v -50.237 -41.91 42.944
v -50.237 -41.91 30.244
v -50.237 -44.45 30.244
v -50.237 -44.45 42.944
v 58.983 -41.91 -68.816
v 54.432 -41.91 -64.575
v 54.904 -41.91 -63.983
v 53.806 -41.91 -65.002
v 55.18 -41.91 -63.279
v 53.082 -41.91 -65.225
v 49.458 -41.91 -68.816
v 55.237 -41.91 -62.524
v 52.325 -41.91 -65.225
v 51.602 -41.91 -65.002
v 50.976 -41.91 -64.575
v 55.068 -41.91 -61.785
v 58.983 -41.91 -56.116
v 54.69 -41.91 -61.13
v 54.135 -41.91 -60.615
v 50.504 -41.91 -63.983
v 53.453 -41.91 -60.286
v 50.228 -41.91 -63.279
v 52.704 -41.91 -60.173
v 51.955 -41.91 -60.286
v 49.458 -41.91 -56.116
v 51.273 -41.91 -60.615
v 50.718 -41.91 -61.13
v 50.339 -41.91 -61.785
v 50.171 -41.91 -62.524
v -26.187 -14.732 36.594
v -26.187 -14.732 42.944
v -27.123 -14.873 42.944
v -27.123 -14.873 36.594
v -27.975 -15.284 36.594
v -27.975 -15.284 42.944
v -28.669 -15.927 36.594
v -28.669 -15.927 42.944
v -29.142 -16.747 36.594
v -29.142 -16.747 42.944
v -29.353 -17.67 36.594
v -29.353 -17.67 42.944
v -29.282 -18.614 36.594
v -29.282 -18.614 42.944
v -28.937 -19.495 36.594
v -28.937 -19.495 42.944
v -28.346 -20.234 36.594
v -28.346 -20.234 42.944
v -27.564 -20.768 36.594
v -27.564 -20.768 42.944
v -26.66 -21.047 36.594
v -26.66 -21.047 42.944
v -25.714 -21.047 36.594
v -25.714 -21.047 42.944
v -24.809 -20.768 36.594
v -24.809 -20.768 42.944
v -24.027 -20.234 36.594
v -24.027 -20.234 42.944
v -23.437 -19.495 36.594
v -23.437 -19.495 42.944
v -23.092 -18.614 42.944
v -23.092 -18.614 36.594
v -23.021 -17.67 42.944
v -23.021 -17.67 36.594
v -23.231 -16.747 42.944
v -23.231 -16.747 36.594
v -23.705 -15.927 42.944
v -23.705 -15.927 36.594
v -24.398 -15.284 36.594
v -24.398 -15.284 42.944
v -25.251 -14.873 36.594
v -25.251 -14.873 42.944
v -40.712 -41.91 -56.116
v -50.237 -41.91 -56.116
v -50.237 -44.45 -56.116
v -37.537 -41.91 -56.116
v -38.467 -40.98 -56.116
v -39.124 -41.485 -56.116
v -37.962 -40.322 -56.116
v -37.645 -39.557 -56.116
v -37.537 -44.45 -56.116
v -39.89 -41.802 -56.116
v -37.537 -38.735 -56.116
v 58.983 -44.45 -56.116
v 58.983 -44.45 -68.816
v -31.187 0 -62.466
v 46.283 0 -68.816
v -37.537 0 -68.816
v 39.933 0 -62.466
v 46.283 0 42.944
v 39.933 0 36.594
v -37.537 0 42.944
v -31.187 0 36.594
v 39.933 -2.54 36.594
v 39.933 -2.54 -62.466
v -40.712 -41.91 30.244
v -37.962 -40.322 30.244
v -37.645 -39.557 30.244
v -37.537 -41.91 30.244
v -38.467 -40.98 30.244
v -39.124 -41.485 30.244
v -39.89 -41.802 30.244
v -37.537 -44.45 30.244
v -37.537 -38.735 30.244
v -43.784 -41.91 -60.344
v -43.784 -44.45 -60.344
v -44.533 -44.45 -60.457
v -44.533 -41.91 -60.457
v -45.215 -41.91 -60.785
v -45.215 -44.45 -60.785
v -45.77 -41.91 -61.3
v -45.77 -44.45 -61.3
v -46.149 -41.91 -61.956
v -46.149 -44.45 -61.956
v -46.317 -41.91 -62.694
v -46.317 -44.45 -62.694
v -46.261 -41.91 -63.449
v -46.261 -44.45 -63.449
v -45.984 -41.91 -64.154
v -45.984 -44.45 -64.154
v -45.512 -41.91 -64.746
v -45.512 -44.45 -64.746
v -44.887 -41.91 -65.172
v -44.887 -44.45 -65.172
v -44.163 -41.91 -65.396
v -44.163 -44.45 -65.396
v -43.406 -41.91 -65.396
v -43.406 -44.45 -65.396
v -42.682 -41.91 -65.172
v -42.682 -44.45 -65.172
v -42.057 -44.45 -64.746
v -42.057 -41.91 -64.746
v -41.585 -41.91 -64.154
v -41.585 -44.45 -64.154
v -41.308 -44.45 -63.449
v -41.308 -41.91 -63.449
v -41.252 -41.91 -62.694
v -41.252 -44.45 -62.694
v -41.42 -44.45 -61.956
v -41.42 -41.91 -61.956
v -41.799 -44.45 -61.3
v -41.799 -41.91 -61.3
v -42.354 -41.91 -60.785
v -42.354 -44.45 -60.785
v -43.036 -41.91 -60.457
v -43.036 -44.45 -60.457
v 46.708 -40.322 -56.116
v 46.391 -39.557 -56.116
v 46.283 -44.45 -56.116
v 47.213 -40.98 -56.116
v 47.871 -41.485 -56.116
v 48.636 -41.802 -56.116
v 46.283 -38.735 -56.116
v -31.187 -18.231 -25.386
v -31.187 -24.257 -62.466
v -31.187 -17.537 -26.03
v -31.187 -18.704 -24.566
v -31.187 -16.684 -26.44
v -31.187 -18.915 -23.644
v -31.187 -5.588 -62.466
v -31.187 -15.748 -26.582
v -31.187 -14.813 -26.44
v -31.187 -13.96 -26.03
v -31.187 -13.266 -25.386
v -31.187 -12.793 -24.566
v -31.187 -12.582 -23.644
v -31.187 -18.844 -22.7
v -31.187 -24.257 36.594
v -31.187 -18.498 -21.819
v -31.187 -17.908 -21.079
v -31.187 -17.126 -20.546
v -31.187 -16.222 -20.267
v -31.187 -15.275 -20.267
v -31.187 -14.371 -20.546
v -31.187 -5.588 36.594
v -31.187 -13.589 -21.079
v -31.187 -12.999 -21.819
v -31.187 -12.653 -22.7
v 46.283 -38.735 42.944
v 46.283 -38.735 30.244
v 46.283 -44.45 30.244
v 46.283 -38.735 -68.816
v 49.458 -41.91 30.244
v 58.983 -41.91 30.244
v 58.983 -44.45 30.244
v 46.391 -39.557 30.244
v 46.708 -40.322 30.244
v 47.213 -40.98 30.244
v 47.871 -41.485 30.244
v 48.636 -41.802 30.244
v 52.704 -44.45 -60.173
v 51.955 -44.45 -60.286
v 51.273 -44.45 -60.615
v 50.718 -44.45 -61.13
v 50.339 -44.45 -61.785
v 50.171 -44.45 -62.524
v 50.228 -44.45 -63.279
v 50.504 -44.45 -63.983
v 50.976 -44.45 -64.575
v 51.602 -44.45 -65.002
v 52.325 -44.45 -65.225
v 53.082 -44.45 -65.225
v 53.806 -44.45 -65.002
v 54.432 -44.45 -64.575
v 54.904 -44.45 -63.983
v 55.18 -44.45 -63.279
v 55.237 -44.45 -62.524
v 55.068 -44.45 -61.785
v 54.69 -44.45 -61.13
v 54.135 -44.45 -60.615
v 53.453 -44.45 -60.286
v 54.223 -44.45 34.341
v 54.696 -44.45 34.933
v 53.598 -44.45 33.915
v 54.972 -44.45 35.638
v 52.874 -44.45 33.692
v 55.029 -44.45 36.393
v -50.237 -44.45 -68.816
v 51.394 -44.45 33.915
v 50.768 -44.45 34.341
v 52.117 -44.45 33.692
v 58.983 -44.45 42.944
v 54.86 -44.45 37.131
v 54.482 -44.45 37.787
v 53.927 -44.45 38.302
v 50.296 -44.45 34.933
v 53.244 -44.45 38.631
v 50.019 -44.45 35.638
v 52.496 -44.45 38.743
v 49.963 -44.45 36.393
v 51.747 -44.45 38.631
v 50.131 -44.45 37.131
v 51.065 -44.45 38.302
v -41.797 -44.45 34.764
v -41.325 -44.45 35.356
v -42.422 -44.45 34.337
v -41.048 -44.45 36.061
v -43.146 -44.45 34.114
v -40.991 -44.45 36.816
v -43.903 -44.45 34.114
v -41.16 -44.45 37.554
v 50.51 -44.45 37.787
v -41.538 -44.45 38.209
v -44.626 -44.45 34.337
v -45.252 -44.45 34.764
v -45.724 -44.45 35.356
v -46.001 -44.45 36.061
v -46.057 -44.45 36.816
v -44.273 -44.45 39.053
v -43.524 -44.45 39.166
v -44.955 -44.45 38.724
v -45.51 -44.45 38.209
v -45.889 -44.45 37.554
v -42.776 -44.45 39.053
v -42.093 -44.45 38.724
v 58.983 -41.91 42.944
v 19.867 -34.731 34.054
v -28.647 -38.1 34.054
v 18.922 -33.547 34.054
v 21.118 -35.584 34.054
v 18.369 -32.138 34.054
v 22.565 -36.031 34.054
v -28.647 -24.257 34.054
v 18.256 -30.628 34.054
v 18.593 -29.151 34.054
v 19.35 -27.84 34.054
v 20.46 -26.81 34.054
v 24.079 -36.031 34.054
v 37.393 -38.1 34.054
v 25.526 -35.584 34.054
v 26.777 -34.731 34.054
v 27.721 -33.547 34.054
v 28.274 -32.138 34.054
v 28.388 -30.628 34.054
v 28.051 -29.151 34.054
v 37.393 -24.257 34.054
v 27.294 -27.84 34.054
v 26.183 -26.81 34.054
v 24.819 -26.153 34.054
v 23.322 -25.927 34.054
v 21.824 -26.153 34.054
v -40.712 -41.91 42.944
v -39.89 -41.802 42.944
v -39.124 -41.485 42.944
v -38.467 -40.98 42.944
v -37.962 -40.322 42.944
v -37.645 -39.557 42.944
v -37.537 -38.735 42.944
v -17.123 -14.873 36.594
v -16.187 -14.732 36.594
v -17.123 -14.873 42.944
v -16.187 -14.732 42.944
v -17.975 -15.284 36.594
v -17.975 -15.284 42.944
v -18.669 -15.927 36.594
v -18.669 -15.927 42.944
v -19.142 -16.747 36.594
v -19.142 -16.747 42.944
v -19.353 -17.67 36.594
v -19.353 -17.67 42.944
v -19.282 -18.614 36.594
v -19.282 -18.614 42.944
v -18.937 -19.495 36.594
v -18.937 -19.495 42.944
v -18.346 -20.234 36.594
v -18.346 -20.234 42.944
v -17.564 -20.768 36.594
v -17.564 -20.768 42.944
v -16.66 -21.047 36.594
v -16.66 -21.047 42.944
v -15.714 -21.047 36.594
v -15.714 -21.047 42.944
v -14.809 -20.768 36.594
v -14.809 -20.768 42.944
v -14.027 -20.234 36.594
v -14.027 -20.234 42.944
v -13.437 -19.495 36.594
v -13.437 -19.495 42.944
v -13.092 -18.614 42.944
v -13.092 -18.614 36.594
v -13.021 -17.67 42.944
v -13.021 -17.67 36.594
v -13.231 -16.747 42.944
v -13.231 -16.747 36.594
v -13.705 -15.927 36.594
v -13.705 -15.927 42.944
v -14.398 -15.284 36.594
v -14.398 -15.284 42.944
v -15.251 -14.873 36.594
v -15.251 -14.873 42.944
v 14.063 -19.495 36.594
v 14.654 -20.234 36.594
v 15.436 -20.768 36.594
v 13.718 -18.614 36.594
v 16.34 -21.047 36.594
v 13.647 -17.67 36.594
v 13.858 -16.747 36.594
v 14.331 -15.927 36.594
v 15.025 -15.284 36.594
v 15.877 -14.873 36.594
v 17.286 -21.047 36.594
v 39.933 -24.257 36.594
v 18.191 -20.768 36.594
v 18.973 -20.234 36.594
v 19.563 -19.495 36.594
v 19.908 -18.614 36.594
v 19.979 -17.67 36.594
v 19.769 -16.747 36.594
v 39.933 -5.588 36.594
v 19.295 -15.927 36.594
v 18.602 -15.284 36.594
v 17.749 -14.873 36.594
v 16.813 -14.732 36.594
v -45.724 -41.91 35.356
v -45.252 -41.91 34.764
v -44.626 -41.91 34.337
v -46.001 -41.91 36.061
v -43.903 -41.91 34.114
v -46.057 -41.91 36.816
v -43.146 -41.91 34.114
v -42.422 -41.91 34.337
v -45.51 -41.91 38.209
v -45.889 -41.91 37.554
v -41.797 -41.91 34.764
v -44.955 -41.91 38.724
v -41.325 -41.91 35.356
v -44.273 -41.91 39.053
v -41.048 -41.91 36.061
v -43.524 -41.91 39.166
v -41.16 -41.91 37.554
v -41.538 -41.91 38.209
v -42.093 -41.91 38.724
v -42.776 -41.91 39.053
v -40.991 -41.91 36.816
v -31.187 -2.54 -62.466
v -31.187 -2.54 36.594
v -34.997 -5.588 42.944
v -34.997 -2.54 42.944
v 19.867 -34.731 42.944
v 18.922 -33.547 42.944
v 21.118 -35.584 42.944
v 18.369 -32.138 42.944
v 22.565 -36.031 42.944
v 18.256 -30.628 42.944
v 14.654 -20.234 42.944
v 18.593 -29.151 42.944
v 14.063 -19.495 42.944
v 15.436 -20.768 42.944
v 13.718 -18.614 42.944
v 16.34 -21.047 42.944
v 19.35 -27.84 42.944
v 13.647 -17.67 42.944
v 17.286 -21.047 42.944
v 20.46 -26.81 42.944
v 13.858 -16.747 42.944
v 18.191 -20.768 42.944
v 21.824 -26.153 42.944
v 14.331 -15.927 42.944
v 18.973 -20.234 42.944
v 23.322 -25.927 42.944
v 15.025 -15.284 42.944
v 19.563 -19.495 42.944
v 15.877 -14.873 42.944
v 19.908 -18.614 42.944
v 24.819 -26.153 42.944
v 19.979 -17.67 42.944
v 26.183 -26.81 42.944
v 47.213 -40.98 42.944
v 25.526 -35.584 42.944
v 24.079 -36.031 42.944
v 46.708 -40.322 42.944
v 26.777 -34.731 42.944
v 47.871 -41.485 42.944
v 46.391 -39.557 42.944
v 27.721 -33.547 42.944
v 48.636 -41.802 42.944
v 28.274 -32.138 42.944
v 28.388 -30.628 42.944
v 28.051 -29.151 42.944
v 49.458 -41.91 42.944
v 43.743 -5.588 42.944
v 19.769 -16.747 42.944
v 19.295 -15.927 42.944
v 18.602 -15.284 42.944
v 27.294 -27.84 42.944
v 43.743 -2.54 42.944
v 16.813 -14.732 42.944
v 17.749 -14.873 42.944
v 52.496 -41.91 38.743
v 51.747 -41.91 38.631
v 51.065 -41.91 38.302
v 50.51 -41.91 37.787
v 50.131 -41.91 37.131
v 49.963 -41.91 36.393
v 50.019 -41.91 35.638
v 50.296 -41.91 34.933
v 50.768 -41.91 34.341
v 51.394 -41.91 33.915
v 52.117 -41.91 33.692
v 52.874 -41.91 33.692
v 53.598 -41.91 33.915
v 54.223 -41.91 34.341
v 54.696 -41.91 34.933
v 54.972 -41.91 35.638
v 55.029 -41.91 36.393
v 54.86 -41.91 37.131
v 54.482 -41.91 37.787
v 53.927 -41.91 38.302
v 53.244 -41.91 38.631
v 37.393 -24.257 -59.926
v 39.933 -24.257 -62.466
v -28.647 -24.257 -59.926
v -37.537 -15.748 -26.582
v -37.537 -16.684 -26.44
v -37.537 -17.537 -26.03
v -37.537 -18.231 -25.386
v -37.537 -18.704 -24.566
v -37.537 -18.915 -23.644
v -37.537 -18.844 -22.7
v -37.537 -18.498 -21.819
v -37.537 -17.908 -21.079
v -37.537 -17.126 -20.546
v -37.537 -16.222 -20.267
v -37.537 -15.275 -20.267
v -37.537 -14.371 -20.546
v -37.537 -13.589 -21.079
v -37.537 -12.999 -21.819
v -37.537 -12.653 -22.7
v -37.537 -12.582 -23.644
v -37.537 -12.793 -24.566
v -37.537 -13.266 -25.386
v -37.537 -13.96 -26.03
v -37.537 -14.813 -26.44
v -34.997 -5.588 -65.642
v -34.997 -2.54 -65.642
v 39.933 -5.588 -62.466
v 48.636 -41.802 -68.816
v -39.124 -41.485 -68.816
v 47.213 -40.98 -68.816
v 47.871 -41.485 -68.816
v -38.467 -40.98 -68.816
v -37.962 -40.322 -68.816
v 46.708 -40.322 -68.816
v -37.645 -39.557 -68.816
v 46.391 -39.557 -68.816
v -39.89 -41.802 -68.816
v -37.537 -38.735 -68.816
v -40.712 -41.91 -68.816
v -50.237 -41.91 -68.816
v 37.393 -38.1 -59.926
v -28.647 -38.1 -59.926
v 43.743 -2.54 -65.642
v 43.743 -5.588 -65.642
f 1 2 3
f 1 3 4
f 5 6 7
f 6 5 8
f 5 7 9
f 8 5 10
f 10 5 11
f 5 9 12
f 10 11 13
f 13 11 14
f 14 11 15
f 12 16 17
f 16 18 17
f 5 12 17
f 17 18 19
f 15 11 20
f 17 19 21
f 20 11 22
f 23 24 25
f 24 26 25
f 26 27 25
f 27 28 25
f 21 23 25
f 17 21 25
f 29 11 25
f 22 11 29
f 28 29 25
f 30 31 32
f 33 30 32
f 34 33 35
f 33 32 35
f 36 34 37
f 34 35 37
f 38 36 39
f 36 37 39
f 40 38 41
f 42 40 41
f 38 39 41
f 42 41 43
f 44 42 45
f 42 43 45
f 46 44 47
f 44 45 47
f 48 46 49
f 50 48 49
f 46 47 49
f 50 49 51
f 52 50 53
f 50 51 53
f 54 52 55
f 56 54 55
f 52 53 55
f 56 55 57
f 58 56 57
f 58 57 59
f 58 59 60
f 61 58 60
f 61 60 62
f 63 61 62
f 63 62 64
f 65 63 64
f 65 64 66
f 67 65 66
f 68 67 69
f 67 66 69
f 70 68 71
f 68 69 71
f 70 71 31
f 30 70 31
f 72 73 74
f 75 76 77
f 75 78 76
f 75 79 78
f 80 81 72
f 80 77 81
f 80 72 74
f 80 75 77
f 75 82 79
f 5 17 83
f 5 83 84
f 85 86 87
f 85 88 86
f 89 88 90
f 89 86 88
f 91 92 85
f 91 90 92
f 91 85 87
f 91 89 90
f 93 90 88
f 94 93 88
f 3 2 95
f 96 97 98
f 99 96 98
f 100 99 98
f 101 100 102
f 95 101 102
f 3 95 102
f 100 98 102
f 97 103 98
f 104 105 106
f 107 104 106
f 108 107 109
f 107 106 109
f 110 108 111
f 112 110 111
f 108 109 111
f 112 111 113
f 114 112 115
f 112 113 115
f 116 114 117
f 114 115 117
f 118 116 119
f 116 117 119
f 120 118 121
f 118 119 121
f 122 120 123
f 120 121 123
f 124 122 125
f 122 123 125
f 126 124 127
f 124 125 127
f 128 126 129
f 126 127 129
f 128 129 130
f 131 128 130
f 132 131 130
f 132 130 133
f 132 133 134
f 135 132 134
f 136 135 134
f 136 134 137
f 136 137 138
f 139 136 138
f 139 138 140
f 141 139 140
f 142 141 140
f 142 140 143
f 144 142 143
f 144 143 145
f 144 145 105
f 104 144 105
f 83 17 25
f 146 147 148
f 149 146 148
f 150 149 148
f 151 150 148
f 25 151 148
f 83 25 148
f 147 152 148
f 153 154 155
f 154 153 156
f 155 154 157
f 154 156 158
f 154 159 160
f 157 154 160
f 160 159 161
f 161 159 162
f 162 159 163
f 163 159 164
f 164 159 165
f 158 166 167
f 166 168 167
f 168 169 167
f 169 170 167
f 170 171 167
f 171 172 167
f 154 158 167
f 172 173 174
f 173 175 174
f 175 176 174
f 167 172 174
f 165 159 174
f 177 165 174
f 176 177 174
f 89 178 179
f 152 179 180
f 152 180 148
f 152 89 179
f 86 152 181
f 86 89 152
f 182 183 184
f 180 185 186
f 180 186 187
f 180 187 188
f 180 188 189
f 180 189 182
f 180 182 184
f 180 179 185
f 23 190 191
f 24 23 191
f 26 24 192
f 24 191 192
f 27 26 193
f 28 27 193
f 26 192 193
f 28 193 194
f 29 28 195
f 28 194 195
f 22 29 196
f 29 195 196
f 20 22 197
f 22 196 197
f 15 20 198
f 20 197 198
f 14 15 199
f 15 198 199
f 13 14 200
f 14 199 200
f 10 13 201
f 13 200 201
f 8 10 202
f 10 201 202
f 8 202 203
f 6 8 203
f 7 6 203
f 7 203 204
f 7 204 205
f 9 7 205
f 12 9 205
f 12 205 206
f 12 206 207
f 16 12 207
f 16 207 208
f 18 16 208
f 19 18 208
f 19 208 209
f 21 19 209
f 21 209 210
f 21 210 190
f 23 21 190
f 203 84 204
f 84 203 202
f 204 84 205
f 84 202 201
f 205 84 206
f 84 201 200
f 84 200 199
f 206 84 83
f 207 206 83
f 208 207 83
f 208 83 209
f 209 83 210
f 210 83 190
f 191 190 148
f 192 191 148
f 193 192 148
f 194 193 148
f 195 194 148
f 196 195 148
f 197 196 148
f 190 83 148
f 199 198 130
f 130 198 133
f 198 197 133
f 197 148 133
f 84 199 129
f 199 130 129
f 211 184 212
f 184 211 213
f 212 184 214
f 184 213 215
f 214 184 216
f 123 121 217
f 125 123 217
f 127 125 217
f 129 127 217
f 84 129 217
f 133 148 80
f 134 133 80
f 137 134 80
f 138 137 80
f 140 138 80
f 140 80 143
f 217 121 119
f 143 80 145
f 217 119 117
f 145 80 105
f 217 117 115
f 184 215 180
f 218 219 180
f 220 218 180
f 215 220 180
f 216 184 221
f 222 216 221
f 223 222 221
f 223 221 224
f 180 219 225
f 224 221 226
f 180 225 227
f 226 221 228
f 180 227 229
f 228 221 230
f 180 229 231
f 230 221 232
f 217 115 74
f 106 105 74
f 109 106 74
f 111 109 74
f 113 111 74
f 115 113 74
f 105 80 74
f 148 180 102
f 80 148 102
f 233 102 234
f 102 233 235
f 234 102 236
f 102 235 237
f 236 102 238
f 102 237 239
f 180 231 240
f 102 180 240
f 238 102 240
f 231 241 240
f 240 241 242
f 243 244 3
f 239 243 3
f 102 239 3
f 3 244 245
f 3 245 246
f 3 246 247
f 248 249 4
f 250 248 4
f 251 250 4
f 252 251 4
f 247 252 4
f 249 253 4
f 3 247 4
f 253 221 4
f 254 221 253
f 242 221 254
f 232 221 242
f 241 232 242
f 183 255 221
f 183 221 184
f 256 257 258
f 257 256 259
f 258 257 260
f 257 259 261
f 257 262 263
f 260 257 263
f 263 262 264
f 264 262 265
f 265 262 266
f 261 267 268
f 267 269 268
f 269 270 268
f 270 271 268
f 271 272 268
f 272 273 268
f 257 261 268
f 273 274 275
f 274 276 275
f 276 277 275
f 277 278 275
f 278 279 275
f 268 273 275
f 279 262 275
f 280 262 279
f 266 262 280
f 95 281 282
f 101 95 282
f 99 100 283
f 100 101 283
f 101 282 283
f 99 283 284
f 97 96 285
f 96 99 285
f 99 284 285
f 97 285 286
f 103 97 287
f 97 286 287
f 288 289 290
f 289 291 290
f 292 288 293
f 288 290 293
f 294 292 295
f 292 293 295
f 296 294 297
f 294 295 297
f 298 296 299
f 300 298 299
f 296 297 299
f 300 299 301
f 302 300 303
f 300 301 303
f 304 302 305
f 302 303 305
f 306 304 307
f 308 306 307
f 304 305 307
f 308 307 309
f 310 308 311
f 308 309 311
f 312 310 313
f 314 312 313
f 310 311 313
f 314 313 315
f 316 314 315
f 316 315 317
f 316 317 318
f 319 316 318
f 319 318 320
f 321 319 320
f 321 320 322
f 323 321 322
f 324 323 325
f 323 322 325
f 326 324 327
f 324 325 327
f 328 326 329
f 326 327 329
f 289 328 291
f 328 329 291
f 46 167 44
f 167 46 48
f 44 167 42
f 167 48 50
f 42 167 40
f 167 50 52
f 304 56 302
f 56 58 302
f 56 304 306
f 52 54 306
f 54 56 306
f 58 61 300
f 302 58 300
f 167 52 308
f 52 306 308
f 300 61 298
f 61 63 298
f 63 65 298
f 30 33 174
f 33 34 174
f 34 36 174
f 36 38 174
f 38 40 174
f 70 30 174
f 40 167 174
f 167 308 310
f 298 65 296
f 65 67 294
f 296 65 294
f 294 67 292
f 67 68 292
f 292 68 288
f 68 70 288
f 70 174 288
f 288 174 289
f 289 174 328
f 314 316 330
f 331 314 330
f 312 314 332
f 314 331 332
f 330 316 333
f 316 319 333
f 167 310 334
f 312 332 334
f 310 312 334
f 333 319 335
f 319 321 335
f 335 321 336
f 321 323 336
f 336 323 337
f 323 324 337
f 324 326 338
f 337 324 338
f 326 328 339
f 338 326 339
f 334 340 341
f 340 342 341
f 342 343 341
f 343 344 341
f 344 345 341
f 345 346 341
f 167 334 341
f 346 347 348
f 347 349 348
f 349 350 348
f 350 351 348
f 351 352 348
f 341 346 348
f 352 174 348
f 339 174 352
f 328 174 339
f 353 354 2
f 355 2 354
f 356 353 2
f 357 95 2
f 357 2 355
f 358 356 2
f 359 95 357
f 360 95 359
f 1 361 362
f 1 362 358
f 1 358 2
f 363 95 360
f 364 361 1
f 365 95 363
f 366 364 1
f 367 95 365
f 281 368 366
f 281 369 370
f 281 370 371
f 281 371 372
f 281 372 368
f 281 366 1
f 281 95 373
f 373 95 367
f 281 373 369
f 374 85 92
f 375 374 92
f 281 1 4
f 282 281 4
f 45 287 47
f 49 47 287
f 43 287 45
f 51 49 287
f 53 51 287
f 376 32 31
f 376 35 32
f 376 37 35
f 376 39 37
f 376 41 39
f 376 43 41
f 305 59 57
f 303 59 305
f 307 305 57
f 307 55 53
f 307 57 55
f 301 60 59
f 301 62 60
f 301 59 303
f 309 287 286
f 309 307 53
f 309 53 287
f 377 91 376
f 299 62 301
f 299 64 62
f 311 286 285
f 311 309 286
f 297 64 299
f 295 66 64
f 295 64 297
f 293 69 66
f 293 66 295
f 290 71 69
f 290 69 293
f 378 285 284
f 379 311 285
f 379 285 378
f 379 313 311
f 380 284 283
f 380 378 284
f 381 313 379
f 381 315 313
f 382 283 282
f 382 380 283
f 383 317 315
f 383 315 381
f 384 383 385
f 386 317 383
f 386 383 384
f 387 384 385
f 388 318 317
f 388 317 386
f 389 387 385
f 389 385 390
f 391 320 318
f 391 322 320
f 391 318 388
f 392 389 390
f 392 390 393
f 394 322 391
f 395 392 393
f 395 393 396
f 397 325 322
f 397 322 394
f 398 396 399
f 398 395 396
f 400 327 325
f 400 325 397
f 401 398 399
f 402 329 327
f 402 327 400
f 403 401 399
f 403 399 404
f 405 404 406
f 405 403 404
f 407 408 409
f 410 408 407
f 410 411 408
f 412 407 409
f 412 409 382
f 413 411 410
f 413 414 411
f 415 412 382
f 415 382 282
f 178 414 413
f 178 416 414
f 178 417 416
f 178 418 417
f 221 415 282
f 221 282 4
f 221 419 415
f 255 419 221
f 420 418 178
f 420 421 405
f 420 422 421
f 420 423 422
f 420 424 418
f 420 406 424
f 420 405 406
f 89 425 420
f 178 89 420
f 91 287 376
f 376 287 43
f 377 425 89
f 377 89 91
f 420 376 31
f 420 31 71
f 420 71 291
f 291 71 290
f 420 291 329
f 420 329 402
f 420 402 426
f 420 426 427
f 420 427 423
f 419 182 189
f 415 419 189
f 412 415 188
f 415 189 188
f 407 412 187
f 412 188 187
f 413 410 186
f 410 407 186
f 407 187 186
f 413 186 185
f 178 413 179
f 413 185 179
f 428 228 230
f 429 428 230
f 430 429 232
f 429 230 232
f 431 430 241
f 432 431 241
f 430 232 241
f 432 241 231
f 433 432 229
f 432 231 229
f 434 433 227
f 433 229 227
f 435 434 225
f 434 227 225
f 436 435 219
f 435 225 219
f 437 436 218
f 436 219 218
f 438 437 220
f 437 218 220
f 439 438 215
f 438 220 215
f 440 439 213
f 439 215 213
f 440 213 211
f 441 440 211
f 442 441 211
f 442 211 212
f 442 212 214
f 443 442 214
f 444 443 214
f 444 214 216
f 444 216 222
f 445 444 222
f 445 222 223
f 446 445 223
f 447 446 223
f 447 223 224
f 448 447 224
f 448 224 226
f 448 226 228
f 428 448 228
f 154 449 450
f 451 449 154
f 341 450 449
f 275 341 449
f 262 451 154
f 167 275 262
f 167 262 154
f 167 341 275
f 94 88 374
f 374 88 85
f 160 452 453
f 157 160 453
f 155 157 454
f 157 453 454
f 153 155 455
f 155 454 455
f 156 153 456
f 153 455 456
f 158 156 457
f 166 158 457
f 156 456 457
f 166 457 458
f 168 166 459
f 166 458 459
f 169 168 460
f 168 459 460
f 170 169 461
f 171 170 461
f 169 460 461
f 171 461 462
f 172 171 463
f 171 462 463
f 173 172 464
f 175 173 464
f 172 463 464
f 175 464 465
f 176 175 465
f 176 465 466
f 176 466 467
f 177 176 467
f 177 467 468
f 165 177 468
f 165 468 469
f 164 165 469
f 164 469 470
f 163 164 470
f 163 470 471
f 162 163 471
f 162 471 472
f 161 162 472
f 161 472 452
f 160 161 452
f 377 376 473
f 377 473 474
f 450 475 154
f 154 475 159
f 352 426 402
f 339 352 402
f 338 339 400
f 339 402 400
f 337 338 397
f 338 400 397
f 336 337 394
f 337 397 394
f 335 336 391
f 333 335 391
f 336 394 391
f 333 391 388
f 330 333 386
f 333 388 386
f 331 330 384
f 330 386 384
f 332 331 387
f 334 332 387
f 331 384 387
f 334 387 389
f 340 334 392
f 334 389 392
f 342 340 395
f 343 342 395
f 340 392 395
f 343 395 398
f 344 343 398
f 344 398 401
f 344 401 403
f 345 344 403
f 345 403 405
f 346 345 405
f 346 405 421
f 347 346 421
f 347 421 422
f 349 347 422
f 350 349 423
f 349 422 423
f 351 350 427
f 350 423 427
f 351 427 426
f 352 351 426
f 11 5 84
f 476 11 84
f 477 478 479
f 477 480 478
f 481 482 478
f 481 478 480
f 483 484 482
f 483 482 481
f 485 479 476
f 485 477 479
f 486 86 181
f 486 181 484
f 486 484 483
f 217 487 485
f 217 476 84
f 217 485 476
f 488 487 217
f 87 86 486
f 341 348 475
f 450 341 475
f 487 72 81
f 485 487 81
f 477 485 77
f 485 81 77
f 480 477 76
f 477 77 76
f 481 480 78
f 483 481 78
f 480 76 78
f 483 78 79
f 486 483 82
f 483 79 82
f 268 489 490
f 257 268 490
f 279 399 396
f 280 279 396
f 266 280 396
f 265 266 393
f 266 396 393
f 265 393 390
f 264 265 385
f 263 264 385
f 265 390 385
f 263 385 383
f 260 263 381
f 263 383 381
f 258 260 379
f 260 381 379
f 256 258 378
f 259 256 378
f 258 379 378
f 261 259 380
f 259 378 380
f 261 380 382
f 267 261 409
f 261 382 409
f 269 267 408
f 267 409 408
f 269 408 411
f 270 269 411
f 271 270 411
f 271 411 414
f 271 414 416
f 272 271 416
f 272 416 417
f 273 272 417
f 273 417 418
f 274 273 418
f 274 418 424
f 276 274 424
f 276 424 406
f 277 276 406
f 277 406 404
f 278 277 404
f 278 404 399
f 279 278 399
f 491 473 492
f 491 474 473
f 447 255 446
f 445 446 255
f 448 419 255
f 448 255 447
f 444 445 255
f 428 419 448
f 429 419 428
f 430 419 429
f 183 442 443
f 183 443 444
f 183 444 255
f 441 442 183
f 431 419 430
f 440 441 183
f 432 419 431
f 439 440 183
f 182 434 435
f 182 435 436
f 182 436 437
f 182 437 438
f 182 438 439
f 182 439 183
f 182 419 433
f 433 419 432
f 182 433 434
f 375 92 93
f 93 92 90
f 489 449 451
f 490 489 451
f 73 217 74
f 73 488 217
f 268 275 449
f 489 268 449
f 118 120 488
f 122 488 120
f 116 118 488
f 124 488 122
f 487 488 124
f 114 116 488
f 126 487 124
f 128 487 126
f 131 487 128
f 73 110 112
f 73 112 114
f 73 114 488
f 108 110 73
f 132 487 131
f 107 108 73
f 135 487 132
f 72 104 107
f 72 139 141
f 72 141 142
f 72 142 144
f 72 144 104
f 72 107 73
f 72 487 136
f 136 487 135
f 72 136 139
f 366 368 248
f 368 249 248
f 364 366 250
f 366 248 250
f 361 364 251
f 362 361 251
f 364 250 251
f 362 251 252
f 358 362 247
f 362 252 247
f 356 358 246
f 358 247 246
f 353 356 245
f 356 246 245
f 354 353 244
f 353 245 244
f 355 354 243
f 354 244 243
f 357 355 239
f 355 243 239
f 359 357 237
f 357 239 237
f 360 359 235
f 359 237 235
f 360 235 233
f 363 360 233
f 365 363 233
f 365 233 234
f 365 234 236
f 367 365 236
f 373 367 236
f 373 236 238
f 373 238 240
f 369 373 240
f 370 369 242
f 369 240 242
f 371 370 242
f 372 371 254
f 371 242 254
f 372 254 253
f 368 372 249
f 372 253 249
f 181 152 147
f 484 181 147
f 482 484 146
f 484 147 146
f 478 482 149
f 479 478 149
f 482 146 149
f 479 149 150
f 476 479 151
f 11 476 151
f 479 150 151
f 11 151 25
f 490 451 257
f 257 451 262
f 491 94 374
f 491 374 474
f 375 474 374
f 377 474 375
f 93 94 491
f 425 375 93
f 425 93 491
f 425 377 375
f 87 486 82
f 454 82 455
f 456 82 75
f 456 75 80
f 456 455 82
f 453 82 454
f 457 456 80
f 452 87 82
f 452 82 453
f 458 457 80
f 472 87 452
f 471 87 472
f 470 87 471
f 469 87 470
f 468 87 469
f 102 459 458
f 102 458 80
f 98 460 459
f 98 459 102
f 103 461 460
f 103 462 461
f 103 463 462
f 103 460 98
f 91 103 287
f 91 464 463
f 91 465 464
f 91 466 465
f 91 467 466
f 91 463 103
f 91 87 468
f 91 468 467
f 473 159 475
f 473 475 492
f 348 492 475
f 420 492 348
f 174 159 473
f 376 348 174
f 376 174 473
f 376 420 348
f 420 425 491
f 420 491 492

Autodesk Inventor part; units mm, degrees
ref_plane "YZ Plane" through (0, 0, 0) normal (1, 0, 0) x (0, 1, 0)
ref_plane "XZ Plane" through (0, 0, 0) normal (0, 1, 0) x (-1, 0, 0)
ref_plane "XY Plane" through (0, 0, 0) normal (0, 0, 1) x (1, 0, 0)
sketch "Sketch1" plane through (0, 0, 0) normal (0, 1, 0) x (-1, 0, 0)
  line L0 (31.1869, 36.5935) -> (-39.9331, 36.5935)
  line L1 (-39.9331, 36.5935) -> (-39.9331, -62.4665)
  line L2 (-39.9331, -62.4665) -> (31.1869, -62.4665)
  line L3 (31.1869, -62.4665) -> (31.1869, 36.5935)
  line L4 (37.5369, 42.9435) -> (-46.2831, 42.9435)
  line L5 (-46.2831, 42.9435) -> (-46.2831, -68.8165)
  line L6 (-46.2831, -68.8165) -> (37.5369, -68.8165)
  line L7 (37.5369, -68.8165) -> (37.5369, 42.9435)
  line L8 (28.6469, 34.0535) -> (-37.3931, 34.0535)
  line L9 (-37.3931, 34.0535) -> (-37.3931, -59.9265)
  line L10 (-37.3931, -59.9265) -> (28.6469, -59.9265)
  line L11 (28.6469, -59.9265) -> (28.6469, 34.0535)
  point P0 (0, 0)
  point P1 (-4.3731, -62.4665)
  point P2 (-4.3731, 36.5935)
  dimension "d0" = 71.12
  dimension "d1" = 99.06
  dimension "d2" = 6.35
  dimension "d3" = 6.35
  dimension "d4" = 6.35
  dimension "d5" = 6.35
  dimension "d22" = 2.54
  dimension "d23" = 2.54
  dimension "d24" = 2.54
  dimension "d25" = 2.54
extrude "Extrusion1" add sketch "Sketch1" against normal blind 44.45 contours L3 L2 L1 L0 | L7 L6 L5 L4 | L11 L10 L9 L8
extrude "Extrusion3" cut sketch "Sketch1" against normal blind 38.1 contours L11 L10 L9 L8
extrude "Extrusion4" cut sketch "Sketch1" against normal blind 24.257 contours L3 L2 L1 L0 | L11 L10 L9 L8
sketch "Sketch5" plane through (-37.5369, 0, 42.9435) normal (0, 0, 1) x (1, 0, 0)
  line L0 (2.54, -2.54) -> (81.28, -2.54)
  line L1 (81.28, -2.54) -> (81.28, -5.588)
  line L2 (81.28, -5.588) -> (2.54, -5.588)
  line L3 (2.54, -5.588) -> (2.54, -2.54)
  line L4 (0, 0) -> (83.82, 0) projected
  line L5 (83.82, 0) -> (83.82, -44.45) projected
  line L6 (0, 0) -> (0, -44.45) projected
  point P0 (37.5369, 0)
  point P1 (81.28, -4.064)
  point P2 (2.54, -4.064)
  dimension "d32" = 2.54
  dimension "d33" = 2.54
  dimension "d34" = 2.54
  dimension "d35" = 3.048
extrude "Extrusion6" cut sketch "Sketch5" against normal blind 108.585
sketch "Sketch6" plane through (39.9331, -24.257, 36.5935) normal (0, 0, -1) x (-1, 0, 0)
  line L0 (71.12, 18.669) -> (71.12, 0) projected
  line L1 (0, 0) -> (71.12, 0) projected
  point P0 (39.9331, 24.257)
  point P1 (66.12, 6.35)
  point P2 (56.12, 6.35)
  point P3 (23.12, 6.35)
  point P4 (71.12, 9.3345)
  dimension "d38" = 5
  dimension "d39" = 15
  dimension "d40" = 48
  dimension "d41" = 6.35
  dimension "d42" = 6.35
  dimension "d43" = 6.35
sketch "Sketch7" plane through (37.3931, -38.1, 34.0535) normal (0, 0, -1) x (-1, 0, 0)
  point P0 (37.3931, 38.1)
  point P1 (14.0713, 7.0927)
hole "Hole1" at (-26.1869, -17.907, 36.5935) at (-16.1869, -17.907, 36.5935) at (16.8131, -17.907, 36.5935) direction (0, 0, 1) diameter 6.35 end through all
hole "Hole2" at (23.3218, -31.0073, 34.0535) direction (0, 0, 1) diameter 10.16 end through all
sketch "Sketch8" plane through (-31.1869, -24.257, 36.5935) normal (1, 0, 0) x (0, 0, -1)
  line L0 (0, 18.669) -> (0, 0) projected
  point P0 (36.5935, 24.257)
  point P1 (60, 8.5086)
  point P2 (0, 9.3345)
  dimension "d58" = 60
hole "Hole3" at (-31.1869, -15.7484, -23.4065) direction (-1, 0, 0) diameter 6.35 end through all
sketch "Sketch9" plane through (46.2831, 0, 42.9435) normal (1, 0, 0) x (0, 0, -1)
  line L0 (0, 0) -> (0, -44.45) projected
  line L1 (111.76, -44.45) -> (0, -44.45) projected
  line L2 (0, -41.91) -> (12.7, -41.91)
  line L3 (12.7, -41.91) -> (12.7, -44.45)
  line L4 (12.7, -44.45) -> (0, -44.45)
  line L5 (0, -44.45) -> (0, -41.91)
  line L6 (111.76, -41.91) -> (99.06, -41.91)
  line L7 (99.06, -41.91) -> (99.06, -44.45)
  line L8 (99.06, -44.45) -> (111.76, -44.45)
  line L9 (111.76, -44.45) -> (111.76, -41.91)
  line L10 (111.76, 0) -> (111.76, -44.45) projected
  point P0 (42.9435, 0)
  point P1 (111.76, -43.18)
  dimension "d66" = 12.7
  dimension "d67" = 12.7
  dimension "d68" = 0
  dimension "d69" = 2.54
  dimension "d70" = 2.54
extrude "Extrusion7" add sketch "Sketch9" along normal blind 12.7
sketch "Sketch10" plane through (46.2831, -41.91, 42.9435) normal (0, 1, 0) x (1, 0, 0)
  point P0 (-46.2831, 42.9435)
  point P1 (6.2127, 6.7401)
  point P2 (6.4208, 105.6569)
hole "Hole4" at (52.4958, -41.91, 36.2034) at (52.7039, -41.91, -62.7134) direction (0, -1, 0) diameter 5.08 end through all clearance for "Flat Head Machine Screw (82)" size "#8" standard "Ansi Unified Screw Threads"
fillet "Fillet1" radius 3.175 2 edges at (46.2831, -41.91, 36.5935) (46.2831, -41.91, -62.4665)
sketch "Sketch11" plane through (-37.5369, 0, -68.8165) normal (-1, 0, 0) x (0, 0, 1)
  line L0 (0, -41.91) -> (12.7, -41.91) projected
  line L1 (12.7, -41.91) -> (12.7, -44.45) projected
  line L2 (0, -41.91) -> (12.7, -41.91)
  line L3 (12.7, -41.91) -> (12.7, -44.45)
  line L4 (12.7, -44.45) -> (0, -44.45)
  line L5 (0, -44.45) -> (0, -41.91)
  line L6 (111.76, -41.91) -> (111.76, -44.45) projected
  line L7 (99.06, -38.735) -> (99.06, -44.45) projected
  line L8 (111.76, -44.45) -> (99.06, -44.45)
  line L9 (99.06, -44.45) -> (99.06, -41.91)
  line L10 (99.06, -41.91) -> (111.76, -41.91)
  line L11 (111.76, -41.91) -> (111.76, -44.45)
  point P0 (68.8165, 0)
extrude "Extrusion8" add sketch "Sketch11" along normal blind 12.7
sketch "Sketch12" plane through (-37.5369, -41.91, -56.1165) normal (0, 1, 0) x (1, 0, 0)
  point P0 (37.5369, -56.1165)
  point P1 (-6.2476, 6.7674)
  point P2 (-5.9874, -92.7423)
hole "Hole5" at (-43.7845, -41.91, -62.8839) at (-43.5243, -41.91, 36.6258) direction (0, -1, 0) diameter 5.08 end through all clearance for "Flat Head Machine Screw (82)" size "#8" standard "Ansi Unified Screw Threads"
fillet "Fillet2" radius 3.175 2 edges at (-37.5369, -41.91, -62.4665) (-37.5369, -41.91, 36.5935)
properties part number "Housing"
